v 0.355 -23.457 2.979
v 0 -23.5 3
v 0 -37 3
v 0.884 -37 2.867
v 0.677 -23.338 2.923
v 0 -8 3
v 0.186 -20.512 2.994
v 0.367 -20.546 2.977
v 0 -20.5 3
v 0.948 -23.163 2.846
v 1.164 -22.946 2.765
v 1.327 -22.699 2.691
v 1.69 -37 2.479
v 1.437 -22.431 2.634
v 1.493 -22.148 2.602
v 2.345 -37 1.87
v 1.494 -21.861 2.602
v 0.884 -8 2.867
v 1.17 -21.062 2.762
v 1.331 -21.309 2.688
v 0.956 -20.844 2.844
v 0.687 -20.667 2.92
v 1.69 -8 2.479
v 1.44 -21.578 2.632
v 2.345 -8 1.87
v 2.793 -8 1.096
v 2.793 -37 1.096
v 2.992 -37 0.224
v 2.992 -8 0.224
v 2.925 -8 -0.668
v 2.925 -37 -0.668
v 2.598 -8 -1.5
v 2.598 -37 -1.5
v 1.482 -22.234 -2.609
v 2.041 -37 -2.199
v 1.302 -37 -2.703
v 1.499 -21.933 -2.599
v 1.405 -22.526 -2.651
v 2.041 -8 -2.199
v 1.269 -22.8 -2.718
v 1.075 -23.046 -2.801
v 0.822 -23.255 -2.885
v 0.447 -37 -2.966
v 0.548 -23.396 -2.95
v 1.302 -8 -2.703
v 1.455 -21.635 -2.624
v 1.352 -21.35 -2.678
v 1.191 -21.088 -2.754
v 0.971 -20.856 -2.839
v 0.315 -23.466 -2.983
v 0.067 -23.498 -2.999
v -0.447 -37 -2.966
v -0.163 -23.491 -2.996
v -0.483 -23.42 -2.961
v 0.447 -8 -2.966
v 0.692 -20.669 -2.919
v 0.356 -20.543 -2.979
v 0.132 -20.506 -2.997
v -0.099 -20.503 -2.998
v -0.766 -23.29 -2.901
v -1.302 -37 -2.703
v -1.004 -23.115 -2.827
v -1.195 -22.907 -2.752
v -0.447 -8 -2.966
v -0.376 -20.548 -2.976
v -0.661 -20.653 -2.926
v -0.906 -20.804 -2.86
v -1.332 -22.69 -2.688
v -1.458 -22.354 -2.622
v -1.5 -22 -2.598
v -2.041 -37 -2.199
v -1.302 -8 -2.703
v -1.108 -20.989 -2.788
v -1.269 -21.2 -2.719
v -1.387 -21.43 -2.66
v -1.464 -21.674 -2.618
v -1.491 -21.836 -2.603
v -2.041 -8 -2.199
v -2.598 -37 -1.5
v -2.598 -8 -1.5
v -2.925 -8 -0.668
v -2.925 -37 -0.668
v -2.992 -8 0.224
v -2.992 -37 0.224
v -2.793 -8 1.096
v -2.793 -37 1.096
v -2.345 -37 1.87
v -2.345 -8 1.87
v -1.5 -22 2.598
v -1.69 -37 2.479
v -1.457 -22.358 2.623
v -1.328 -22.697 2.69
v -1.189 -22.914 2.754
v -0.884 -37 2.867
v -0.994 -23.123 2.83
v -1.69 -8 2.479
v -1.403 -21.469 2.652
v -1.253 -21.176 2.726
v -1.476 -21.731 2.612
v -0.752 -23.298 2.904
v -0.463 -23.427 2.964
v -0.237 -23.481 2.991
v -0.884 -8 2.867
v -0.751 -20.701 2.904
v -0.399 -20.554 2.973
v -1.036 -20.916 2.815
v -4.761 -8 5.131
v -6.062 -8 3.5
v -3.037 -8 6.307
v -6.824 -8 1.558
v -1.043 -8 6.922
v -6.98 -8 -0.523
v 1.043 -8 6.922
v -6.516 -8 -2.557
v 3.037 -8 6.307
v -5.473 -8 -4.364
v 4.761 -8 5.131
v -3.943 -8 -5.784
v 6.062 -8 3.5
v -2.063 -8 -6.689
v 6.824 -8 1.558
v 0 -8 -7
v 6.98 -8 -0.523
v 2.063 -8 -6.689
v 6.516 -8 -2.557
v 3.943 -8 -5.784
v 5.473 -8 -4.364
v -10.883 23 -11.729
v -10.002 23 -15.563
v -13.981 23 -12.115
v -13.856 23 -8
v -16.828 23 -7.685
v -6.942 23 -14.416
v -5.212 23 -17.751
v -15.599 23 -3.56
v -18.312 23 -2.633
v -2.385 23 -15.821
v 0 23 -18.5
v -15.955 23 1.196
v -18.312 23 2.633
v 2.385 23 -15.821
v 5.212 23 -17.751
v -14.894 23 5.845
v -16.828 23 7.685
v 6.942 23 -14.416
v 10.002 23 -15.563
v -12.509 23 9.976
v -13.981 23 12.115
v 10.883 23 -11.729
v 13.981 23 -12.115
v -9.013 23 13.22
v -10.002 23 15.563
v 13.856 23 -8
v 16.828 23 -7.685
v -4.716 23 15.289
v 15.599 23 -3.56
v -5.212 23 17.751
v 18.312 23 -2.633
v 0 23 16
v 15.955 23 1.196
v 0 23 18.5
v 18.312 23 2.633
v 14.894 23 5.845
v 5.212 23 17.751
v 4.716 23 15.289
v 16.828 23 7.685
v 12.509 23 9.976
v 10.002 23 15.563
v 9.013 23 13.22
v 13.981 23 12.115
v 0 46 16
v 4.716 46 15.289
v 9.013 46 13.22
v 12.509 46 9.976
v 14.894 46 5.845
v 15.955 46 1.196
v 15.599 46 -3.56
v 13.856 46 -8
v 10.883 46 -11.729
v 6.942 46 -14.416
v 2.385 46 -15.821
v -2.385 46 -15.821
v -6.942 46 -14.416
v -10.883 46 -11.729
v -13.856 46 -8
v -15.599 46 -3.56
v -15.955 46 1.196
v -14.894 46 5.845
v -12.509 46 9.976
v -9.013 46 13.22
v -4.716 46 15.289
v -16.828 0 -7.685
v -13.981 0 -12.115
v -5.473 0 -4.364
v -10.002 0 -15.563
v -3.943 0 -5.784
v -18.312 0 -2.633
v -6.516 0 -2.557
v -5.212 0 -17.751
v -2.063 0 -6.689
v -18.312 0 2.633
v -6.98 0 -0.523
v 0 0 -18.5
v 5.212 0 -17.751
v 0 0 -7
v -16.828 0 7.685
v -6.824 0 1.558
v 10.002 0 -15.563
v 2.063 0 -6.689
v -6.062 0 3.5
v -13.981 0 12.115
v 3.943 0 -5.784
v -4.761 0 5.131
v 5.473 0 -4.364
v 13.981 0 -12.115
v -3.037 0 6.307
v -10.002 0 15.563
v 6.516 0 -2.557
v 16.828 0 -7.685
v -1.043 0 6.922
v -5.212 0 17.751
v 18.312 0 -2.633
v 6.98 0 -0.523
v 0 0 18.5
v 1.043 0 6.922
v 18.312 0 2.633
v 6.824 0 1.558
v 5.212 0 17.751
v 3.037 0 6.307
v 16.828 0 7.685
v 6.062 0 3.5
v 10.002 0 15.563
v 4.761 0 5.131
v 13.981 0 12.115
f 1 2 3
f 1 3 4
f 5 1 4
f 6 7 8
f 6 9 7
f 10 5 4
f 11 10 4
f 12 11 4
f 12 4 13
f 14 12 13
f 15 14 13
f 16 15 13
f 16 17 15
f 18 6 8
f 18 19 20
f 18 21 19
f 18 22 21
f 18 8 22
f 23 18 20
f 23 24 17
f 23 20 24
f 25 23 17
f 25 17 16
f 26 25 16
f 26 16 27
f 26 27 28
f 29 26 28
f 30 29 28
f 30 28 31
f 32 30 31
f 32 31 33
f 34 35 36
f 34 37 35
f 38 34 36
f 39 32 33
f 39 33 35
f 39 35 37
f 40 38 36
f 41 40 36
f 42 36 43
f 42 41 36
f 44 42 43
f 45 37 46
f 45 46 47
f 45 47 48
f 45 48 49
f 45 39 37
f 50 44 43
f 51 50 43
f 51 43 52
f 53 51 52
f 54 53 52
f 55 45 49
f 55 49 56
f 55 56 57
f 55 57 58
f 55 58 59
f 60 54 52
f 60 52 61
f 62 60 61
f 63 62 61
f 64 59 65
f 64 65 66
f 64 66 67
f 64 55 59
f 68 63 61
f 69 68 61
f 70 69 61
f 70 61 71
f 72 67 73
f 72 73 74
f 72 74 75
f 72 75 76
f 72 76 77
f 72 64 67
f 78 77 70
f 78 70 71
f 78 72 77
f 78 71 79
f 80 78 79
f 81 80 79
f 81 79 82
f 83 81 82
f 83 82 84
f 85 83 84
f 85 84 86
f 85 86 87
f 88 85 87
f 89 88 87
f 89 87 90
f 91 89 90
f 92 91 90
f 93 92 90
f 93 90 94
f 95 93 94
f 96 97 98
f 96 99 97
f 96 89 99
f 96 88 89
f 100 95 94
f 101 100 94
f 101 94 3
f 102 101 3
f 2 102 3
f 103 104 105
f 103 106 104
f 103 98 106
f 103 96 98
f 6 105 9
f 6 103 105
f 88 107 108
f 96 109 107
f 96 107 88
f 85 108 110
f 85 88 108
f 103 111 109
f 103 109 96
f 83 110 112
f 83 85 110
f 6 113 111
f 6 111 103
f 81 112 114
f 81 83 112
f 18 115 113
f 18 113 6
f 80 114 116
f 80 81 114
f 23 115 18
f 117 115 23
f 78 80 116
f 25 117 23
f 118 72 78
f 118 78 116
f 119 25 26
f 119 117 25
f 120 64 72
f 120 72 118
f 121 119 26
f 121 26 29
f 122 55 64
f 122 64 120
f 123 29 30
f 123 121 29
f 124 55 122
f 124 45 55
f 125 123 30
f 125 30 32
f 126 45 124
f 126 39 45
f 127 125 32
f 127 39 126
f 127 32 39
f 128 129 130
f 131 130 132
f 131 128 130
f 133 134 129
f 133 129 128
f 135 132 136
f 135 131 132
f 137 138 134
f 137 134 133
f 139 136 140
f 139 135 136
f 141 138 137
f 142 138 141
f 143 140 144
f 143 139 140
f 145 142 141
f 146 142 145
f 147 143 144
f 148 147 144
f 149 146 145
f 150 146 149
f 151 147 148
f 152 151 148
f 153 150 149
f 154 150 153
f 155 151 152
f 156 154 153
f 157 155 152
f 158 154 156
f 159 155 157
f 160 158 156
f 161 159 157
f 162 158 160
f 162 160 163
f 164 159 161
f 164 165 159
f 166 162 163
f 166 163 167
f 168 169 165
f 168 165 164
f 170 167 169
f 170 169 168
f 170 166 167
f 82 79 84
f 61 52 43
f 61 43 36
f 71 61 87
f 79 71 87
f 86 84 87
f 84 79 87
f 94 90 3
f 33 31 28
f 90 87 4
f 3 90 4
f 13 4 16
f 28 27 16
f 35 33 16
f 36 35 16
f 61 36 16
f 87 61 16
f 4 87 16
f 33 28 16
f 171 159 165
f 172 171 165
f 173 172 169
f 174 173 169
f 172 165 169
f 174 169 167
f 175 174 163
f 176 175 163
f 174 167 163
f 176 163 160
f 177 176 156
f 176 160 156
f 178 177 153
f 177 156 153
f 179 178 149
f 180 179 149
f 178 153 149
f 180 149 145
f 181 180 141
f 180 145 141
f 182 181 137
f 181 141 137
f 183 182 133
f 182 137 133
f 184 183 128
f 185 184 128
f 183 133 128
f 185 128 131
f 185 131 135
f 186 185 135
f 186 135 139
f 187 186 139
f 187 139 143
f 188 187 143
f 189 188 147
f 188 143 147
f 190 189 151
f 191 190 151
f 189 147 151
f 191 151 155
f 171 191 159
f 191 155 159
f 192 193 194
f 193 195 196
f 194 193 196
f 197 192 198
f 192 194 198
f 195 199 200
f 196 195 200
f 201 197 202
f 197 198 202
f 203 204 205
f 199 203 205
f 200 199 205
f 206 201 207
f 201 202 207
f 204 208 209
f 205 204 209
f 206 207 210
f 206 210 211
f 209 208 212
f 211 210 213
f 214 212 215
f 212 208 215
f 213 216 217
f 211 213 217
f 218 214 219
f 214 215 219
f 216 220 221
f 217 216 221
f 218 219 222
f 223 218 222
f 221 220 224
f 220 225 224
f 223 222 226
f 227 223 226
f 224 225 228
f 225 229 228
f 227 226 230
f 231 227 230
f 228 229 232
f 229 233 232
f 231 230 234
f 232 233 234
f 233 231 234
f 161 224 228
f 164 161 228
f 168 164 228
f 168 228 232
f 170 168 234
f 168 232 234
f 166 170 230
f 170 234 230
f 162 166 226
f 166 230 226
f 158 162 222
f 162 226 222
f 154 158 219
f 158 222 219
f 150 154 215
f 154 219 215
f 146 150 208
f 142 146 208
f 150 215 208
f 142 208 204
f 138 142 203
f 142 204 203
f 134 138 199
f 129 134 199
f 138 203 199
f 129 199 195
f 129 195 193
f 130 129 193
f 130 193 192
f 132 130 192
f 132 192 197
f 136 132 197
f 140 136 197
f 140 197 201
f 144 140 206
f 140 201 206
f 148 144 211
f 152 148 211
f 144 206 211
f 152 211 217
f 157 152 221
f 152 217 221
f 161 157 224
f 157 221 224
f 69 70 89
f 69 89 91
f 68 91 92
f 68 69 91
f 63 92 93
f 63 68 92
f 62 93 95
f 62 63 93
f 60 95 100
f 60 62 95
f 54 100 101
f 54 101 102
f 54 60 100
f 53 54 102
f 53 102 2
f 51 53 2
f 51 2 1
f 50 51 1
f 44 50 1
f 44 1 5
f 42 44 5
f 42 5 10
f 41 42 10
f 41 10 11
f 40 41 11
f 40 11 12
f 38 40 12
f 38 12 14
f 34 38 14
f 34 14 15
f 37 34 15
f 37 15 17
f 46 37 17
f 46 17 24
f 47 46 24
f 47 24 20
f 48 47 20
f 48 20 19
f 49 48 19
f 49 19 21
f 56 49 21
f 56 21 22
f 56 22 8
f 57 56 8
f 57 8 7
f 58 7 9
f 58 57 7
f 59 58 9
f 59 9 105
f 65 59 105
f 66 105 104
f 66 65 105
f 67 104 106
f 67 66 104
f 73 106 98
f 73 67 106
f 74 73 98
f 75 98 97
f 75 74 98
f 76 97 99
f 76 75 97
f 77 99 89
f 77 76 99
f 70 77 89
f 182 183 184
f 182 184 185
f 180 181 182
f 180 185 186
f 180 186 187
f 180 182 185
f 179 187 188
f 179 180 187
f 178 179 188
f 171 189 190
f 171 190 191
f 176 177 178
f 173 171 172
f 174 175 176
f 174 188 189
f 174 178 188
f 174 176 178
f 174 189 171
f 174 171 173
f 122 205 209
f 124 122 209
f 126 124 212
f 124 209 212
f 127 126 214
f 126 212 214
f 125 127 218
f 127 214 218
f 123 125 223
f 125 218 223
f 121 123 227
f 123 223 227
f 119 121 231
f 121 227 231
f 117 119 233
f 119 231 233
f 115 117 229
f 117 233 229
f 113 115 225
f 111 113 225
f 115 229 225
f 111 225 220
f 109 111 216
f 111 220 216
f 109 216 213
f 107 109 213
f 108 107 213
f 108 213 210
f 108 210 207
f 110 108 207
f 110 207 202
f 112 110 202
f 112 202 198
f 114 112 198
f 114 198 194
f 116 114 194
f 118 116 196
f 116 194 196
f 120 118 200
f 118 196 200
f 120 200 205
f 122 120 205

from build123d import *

# Parameters (mm, degrees)
SKETCH2_R               = 18.5
BOSS_EXTRUDE1_DEPTH     = 23
SKETCH3_R               = 16
BOSS_EXTRUDE2_DEPTH     = 23
SKETCH4_R               = 7
BOSS_EXTRUDE3_DEPTH     = 8
SKETCH12_R              = 3
BOSS_EXTRUDE6_DEPTH     = 37
CUT_EXTRUDE1_DEPTH      = 10
CUT_EXTRUDE1_DEPTH_BACK = 10
SKETCH7_R               = 1.5


with BuildPart() as part:
    # Sketch2 → Boss-Extrude1 (new body)
    with BuildSketch(Plane(origin=(0, 0, 0), x_dir=(1, 0, 0), z_dir=(0, 1, 0))):
        Circle(SKETCH2_R)
    extrude(amount=BOSS_EXTRUDE1_DEPTH)

    # Sketch3 → Boss-Extrude2 (add)
    with BuildSketch(Plane(origin=(0, 23, 0), x_dir=(1, 0, 0), z_dir=(0, 1, 0))):
        Circle(SKETCH3_R)
    extrude(amount=BOSS_EXTRUDE2_DEPTH)

    # Sketch4 → Boss-Extrude3 (add)
    with BuildSketch(Plane.XZ):
        Circle(SKETCH4_R)
    extrude(amount=BOSS_EXTRUDE3_DEPTH)

    # Sketch12 → Boss-Extrude6 (add)
    with BuildSketch(Plane(origin=(0, 0, 0), x_dir=(1, 0, 0), z_dir=(0, 1, 0))):
        Circle(SKETCH12_R)
    extrude(amount=-BOSS_EXTRUDE6_DEPTH)

    # Sketch7 → Cut-Extrude1 (cut, two sides: drawn at the far end of the back side and taken through both)
    with BuildSketch(Plane.XY.offset(-CUT_EXTRUDE1_DEPTH_BACK)):
        with Locations((0, -22)):
            Circle(SKETCH7_R)
    extrude(amount=CUT_EXTRUDE1_DEPTH + CUT_EXTRUDE1_DEPTH_BACK, mode=Mode.SUBTRACT)


solid = part.part
